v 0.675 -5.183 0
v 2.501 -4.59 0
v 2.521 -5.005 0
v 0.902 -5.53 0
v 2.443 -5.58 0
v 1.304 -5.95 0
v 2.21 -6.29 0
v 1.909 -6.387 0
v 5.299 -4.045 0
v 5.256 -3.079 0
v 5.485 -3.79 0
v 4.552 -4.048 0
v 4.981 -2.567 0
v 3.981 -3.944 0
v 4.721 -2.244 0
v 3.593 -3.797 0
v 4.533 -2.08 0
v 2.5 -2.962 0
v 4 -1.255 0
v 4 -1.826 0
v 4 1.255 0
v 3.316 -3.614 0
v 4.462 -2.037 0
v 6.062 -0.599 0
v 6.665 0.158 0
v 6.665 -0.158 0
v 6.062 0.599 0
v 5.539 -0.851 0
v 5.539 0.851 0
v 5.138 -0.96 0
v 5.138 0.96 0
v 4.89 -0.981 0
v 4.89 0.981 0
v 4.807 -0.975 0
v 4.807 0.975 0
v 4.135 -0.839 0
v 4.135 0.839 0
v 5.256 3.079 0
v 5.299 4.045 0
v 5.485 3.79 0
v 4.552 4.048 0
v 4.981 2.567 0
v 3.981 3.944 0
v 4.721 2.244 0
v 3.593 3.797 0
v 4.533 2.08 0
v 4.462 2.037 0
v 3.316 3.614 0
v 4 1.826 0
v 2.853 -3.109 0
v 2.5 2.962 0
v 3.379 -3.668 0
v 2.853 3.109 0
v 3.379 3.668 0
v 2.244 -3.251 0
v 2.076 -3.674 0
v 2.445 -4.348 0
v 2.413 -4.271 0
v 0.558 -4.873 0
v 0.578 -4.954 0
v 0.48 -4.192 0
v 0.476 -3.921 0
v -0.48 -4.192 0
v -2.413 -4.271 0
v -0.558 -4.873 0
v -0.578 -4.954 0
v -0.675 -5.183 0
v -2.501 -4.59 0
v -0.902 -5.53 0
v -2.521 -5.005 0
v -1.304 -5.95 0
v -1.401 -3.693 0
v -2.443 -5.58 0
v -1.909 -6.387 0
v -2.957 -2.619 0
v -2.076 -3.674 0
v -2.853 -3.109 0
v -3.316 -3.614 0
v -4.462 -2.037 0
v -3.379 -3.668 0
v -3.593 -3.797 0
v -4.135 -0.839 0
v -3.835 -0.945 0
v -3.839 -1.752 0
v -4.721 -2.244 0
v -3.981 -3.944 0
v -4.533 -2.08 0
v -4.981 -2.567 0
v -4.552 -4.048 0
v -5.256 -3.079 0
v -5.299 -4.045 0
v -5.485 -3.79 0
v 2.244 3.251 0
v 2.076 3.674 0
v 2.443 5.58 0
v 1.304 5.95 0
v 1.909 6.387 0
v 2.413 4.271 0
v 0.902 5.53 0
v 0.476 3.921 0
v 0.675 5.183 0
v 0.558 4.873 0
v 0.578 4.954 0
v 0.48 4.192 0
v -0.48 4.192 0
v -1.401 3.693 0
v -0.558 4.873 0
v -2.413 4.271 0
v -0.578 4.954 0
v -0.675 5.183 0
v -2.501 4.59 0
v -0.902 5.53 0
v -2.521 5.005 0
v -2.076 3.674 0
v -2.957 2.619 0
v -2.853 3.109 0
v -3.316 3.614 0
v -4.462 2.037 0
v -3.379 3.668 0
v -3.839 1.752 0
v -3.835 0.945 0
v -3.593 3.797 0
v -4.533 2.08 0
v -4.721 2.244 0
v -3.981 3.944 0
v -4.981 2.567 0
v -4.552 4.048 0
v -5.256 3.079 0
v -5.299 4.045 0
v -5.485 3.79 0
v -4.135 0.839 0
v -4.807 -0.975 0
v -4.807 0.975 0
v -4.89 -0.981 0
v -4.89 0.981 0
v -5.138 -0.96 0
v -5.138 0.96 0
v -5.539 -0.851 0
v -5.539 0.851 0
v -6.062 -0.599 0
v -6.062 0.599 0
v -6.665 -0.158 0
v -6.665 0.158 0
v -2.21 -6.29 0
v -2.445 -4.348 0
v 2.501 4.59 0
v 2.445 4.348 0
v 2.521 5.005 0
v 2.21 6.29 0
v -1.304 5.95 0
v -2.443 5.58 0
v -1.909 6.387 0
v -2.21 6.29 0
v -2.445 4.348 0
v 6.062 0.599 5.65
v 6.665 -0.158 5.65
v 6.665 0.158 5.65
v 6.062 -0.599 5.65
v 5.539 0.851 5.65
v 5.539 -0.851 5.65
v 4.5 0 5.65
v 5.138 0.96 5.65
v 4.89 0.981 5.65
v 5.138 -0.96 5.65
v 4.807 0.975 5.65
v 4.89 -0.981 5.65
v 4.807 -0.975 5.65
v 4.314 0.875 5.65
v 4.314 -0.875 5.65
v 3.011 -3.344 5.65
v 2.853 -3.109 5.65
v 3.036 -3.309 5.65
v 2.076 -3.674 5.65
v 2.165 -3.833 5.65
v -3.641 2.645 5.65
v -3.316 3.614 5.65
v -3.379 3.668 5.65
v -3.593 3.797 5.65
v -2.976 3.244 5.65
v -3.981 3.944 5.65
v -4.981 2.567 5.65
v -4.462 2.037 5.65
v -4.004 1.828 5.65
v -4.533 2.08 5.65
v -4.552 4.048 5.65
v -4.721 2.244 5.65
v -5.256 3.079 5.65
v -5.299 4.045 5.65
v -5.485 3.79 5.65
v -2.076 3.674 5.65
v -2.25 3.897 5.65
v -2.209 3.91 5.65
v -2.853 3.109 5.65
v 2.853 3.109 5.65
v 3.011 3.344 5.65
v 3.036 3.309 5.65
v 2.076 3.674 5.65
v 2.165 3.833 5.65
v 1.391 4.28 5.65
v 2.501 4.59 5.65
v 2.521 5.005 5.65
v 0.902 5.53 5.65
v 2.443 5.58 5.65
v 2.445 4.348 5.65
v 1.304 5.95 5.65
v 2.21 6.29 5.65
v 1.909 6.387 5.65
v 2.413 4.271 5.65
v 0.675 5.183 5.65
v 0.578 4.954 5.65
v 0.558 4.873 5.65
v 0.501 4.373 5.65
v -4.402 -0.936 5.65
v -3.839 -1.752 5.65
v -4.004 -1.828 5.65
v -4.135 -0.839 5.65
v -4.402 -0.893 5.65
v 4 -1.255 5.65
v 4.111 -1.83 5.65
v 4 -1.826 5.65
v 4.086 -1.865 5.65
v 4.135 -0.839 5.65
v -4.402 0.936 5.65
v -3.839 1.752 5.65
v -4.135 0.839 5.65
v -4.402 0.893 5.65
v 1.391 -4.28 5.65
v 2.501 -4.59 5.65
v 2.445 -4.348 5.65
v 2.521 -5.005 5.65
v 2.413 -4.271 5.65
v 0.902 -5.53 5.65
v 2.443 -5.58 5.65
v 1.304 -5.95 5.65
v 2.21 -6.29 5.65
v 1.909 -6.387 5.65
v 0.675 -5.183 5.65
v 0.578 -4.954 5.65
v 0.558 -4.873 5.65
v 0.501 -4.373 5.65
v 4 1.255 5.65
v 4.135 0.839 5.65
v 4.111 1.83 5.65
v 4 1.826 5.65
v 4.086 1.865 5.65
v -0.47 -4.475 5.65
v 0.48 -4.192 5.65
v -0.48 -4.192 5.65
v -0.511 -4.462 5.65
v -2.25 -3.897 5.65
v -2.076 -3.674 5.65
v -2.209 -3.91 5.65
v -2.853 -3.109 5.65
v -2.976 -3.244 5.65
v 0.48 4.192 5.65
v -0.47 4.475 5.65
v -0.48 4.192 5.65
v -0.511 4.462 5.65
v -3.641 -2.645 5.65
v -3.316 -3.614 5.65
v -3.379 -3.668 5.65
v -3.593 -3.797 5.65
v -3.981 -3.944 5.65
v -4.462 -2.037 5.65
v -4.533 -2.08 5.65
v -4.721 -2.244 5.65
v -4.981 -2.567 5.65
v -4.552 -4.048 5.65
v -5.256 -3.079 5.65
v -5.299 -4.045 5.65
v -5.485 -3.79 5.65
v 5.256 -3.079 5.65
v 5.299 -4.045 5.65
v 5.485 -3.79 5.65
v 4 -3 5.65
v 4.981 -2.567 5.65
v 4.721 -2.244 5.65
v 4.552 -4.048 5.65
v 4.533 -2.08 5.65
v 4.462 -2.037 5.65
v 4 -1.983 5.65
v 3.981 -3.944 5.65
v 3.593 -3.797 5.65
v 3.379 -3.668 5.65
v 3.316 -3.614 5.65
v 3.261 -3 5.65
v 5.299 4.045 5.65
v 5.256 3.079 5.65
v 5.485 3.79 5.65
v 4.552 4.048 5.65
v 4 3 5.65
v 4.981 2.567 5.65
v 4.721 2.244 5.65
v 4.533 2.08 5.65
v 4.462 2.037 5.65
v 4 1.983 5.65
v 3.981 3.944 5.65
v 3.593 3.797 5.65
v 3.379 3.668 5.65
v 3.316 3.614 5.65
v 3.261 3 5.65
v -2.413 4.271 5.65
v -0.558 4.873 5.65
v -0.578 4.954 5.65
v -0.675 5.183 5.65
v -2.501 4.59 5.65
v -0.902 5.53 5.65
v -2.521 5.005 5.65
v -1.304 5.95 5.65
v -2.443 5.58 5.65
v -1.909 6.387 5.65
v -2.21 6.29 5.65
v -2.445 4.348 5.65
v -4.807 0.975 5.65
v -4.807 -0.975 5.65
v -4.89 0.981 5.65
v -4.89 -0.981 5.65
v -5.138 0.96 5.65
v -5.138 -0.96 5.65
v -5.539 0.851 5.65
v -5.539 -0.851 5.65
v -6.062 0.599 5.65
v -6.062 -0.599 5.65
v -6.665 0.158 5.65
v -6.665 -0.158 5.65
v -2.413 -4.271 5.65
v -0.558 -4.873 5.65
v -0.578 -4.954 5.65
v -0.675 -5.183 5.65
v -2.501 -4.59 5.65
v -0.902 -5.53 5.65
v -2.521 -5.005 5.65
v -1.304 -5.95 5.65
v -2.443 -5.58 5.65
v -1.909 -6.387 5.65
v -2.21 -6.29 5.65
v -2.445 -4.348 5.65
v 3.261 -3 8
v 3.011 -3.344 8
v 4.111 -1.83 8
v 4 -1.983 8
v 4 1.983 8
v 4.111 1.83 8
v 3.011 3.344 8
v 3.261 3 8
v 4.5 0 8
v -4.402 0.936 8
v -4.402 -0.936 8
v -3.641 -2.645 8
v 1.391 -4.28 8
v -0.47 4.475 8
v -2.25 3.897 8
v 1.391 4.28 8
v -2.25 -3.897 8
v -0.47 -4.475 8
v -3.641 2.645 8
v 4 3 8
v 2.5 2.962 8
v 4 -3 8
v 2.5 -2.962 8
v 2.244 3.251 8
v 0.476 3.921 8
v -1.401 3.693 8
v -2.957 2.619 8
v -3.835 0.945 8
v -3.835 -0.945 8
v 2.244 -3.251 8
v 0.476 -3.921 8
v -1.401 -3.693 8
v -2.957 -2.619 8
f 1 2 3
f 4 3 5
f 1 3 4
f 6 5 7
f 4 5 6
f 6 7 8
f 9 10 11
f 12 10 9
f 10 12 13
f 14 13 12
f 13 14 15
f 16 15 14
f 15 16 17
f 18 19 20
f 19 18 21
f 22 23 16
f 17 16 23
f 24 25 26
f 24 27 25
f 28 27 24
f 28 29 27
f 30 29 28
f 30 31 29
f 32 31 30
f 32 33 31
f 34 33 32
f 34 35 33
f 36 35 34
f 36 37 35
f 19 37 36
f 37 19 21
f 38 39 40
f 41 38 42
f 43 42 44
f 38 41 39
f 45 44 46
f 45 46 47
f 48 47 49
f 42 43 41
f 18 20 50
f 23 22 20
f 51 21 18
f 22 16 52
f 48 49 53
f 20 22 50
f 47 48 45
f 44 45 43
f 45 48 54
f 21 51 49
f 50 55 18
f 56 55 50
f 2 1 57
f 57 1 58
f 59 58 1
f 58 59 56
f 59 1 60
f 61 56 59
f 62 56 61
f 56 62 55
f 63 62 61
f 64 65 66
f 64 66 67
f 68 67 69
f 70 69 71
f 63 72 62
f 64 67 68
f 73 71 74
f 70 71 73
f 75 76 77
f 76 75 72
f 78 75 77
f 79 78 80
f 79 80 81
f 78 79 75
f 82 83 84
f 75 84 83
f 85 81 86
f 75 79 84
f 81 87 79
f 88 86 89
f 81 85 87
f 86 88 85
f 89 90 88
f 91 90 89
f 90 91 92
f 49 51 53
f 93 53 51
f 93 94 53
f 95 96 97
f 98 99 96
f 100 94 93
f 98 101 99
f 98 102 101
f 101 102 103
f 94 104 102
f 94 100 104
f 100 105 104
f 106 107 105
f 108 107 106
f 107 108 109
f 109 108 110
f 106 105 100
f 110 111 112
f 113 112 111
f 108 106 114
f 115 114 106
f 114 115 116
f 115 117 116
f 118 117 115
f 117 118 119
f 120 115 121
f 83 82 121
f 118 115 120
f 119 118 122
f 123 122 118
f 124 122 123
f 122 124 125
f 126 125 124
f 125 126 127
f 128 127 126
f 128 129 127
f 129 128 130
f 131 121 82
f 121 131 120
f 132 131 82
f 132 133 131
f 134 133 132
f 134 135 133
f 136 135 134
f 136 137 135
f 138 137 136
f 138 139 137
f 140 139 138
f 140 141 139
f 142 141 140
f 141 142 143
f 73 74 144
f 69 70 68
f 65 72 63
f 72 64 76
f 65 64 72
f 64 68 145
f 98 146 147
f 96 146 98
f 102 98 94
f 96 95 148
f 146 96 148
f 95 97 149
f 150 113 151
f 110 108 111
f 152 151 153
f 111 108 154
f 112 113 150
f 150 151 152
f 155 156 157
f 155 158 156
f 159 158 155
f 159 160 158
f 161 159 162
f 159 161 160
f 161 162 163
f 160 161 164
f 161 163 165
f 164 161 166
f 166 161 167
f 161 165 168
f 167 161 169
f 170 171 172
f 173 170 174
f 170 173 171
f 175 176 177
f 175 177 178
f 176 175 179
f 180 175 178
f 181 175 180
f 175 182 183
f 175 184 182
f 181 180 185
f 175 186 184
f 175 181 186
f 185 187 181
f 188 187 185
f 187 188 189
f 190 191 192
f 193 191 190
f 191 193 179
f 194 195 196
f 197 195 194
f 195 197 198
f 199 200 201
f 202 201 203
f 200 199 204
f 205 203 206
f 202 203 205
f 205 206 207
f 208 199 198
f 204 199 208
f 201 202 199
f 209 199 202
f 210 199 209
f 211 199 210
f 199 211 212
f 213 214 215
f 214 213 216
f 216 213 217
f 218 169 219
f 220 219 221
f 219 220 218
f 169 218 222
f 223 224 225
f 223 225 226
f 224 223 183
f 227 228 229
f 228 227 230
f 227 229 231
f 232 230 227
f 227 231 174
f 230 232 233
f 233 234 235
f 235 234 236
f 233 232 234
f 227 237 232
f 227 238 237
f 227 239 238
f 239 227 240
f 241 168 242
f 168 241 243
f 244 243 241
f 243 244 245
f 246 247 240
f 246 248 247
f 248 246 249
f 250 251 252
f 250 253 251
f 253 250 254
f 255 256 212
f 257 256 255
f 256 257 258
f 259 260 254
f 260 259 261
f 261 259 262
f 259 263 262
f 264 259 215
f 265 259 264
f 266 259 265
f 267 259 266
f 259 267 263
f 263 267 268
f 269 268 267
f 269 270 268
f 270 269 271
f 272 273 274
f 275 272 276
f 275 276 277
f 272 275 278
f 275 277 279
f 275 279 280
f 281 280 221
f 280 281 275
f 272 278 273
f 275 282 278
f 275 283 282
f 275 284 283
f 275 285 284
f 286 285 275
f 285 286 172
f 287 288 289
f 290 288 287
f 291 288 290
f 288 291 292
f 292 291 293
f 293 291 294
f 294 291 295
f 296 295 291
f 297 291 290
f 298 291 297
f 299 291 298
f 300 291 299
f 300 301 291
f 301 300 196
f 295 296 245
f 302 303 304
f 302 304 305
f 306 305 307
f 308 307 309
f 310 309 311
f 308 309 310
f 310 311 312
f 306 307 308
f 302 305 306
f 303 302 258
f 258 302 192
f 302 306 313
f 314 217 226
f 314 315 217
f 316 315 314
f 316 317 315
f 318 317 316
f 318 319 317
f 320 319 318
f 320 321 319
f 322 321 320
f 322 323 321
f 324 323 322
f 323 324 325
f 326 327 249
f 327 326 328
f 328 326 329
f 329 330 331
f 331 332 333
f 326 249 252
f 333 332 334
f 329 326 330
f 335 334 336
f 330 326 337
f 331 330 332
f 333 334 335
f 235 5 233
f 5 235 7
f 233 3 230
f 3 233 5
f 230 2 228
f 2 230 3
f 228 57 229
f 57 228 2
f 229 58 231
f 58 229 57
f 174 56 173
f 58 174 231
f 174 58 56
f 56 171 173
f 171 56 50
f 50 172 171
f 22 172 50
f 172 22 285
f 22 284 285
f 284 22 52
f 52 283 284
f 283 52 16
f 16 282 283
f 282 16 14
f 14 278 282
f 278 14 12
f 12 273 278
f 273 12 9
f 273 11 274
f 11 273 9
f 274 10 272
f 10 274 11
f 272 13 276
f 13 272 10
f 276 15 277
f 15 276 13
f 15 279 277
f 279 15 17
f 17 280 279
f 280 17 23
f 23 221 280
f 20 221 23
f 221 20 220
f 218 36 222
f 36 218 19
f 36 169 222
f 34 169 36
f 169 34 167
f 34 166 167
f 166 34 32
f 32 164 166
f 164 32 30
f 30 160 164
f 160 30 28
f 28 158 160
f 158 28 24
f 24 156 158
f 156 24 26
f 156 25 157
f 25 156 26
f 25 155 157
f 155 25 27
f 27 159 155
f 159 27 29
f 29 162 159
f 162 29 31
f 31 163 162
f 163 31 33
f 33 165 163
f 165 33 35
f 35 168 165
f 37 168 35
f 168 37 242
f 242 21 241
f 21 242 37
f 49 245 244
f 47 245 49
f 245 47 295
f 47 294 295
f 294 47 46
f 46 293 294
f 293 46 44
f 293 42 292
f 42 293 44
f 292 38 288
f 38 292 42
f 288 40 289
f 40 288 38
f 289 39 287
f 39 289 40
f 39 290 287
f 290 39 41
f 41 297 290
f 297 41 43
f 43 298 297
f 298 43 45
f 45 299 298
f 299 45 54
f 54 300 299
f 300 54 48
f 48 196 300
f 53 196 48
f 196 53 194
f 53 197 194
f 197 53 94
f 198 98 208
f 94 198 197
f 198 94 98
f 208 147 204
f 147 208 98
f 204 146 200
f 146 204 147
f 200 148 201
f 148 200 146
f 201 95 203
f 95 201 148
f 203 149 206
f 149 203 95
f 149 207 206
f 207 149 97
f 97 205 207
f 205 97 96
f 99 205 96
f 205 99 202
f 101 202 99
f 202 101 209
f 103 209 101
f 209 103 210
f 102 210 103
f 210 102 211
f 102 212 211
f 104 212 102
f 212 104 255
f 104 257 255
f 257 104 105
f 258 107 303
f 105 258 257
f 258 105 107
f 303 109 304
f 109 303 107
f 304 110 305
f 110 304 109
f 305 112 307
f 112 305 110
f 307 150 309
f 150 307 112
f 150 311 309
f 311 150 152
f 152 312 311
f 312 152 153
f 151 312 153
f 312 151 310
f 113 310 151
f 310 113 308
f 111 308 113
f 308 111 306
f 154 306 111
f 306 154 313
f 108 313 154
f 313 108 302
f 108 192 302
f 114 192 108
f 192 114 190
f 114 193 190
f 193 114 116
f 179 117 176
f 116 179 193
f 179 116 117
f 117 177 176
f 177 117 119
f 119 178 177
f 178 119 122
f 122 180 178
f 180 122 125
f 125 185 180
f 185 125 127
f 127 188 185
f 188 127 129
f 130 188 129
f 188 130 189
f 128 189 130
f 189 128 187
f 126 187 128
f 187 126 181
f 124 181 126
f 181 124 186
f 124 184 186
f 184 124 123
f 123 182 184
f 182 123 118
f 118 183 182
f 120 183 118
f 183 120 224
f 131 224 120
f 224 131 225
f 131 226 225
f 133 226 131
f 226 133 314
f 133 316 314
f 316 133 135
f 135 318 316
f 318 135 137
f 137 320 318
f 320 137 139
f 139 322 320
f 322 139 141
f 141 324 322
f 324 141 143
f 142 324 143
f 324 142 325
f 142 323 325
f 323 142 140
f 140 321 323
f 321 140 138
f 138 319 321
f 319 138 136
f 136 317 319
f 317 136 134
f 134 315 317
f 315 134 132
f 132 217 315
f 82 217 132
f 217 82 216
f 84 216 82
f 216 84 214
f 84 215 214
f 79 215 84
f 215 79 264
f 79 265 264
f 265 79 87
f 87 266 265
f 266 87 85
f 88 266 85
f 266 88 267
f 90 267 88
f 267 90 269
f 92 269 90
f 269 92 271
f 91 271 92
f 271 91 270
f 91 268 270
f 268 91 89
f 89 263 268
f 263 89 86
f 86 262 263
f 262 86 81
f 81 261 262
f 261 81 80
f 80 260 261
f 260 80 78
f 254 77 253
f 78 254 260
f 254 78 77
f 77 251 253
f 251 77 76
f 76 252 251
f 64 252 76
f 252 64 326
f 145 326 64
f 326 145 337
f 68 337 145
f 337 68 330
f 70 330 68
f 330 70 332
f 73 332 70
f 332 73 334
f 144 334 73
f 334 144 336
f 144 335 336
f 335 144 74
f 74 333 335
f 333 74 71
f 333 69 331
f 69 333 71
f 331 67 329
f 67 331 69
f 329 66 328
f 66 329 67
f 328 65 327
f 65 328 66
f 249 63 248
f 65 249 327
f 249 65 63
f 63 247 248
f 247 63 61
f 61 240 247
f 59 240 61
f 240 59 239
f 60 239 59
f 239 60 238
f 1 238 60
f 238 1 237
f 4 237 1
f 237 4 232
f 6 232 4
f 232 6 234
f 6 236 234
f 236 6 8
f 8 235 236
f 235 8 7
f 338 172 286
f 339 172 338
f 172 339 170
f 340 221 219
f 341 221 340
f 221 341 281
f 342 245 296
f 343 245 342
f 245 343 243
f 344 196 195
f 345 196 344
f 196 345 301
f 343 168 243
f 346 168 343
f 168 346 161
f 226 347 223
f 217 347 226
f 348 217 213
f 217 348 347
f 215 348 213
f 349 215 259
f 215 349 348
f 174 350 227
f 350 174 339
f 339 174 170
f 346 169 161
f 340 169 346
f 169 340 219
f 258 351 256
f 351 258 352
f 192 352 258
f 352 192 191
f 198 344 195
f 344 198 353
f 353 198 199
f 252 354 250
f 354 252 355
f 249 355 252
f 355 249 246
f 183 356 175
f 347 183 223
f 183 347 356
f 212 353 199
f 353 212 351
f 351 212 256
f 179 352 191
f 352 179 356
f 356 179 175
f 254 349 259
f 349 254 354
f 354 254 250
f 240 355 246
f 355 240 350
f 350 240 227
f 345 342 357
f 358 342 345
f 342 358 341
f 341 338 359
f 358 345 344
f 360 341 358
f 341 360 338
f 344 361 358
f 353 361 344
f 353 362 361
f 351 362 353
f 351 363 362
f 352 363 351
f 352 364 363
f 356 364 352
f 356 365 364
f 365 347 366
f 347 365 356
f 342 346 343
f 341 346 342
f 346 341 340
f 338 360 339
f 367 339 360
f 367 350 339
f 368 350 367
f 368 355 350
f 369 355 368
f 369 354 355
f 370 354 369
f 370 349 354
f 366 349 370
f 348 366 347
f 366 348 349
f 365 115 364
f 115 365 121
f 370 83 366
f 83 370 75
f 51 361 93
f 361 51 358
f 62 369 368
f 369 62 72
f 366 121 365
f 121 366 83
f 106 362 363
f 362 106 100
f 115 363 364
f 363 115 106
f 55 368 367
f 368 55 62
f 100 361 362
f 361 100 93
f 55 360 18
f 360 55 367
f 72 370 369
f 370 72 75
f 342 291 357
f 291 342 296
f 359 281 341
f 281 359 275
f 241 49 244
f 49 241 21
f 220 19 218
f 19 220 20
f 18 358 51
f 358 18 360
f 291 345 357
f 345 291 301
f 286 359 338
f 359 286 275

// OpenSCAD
include <parametric_involute_gear_v5.0.scad>

// gear (circular_pitch=700,
//  gear_thickness = 5.65,
//  rim_thickness = 5.65,
//  rim_width=0, // 2
//  hub_thickness = 5.65, // 7.0
//  hub_diameter = 7.9,
//  bore_diameter = 7.9,
//  number_of_teeth = 26,
//  clearance=0.5,
//  circular_pitch=200,
//  circles=5); // 9


// gear (
//  // circular_pitch=700,
//  gear_thickness = 5.65,
//  rim_thickness = 5.65,
//  // rim_width=2, // 2
//  hub_thickness = 5.65, // 7.0
//  hub_diameter = 7.9,
//  bore_diameter = 7.9,
//  number_of_teeth = 15,
//  clearance=0.5,
//  circular_pitch=200,
//  circles=5); // 9

gear (
 // circular_pitch=700,
 gear_thickness = 5.65,
 rim_thickness = 5.65,
 // rim_width=2, // 2
 hub_thickness = 8, // 7.0
 hub_diameter = 9,
 bore_diameter = 7.9,
 number_of_teeth = 10,
 // clearance=0.5,
 circular_pitch=200,
 circles=5); // 9
translate([2.5,-3,0]) cube([1.5,6,8]);

// gear (
//  // circular_pitch=700,
//  gear_thickness = 5.65,
//  rim_thickness = 5.65,
//  rim_width=2,
//  hub_thickness = 5.65,
//  hub_diameter = 12,
//  bore_diameter = 6.4,
//  number_of_teeth = 20, // 19
//  clearance=0.5,
//  circular_pitch=200,
//  circles=0); // 9
